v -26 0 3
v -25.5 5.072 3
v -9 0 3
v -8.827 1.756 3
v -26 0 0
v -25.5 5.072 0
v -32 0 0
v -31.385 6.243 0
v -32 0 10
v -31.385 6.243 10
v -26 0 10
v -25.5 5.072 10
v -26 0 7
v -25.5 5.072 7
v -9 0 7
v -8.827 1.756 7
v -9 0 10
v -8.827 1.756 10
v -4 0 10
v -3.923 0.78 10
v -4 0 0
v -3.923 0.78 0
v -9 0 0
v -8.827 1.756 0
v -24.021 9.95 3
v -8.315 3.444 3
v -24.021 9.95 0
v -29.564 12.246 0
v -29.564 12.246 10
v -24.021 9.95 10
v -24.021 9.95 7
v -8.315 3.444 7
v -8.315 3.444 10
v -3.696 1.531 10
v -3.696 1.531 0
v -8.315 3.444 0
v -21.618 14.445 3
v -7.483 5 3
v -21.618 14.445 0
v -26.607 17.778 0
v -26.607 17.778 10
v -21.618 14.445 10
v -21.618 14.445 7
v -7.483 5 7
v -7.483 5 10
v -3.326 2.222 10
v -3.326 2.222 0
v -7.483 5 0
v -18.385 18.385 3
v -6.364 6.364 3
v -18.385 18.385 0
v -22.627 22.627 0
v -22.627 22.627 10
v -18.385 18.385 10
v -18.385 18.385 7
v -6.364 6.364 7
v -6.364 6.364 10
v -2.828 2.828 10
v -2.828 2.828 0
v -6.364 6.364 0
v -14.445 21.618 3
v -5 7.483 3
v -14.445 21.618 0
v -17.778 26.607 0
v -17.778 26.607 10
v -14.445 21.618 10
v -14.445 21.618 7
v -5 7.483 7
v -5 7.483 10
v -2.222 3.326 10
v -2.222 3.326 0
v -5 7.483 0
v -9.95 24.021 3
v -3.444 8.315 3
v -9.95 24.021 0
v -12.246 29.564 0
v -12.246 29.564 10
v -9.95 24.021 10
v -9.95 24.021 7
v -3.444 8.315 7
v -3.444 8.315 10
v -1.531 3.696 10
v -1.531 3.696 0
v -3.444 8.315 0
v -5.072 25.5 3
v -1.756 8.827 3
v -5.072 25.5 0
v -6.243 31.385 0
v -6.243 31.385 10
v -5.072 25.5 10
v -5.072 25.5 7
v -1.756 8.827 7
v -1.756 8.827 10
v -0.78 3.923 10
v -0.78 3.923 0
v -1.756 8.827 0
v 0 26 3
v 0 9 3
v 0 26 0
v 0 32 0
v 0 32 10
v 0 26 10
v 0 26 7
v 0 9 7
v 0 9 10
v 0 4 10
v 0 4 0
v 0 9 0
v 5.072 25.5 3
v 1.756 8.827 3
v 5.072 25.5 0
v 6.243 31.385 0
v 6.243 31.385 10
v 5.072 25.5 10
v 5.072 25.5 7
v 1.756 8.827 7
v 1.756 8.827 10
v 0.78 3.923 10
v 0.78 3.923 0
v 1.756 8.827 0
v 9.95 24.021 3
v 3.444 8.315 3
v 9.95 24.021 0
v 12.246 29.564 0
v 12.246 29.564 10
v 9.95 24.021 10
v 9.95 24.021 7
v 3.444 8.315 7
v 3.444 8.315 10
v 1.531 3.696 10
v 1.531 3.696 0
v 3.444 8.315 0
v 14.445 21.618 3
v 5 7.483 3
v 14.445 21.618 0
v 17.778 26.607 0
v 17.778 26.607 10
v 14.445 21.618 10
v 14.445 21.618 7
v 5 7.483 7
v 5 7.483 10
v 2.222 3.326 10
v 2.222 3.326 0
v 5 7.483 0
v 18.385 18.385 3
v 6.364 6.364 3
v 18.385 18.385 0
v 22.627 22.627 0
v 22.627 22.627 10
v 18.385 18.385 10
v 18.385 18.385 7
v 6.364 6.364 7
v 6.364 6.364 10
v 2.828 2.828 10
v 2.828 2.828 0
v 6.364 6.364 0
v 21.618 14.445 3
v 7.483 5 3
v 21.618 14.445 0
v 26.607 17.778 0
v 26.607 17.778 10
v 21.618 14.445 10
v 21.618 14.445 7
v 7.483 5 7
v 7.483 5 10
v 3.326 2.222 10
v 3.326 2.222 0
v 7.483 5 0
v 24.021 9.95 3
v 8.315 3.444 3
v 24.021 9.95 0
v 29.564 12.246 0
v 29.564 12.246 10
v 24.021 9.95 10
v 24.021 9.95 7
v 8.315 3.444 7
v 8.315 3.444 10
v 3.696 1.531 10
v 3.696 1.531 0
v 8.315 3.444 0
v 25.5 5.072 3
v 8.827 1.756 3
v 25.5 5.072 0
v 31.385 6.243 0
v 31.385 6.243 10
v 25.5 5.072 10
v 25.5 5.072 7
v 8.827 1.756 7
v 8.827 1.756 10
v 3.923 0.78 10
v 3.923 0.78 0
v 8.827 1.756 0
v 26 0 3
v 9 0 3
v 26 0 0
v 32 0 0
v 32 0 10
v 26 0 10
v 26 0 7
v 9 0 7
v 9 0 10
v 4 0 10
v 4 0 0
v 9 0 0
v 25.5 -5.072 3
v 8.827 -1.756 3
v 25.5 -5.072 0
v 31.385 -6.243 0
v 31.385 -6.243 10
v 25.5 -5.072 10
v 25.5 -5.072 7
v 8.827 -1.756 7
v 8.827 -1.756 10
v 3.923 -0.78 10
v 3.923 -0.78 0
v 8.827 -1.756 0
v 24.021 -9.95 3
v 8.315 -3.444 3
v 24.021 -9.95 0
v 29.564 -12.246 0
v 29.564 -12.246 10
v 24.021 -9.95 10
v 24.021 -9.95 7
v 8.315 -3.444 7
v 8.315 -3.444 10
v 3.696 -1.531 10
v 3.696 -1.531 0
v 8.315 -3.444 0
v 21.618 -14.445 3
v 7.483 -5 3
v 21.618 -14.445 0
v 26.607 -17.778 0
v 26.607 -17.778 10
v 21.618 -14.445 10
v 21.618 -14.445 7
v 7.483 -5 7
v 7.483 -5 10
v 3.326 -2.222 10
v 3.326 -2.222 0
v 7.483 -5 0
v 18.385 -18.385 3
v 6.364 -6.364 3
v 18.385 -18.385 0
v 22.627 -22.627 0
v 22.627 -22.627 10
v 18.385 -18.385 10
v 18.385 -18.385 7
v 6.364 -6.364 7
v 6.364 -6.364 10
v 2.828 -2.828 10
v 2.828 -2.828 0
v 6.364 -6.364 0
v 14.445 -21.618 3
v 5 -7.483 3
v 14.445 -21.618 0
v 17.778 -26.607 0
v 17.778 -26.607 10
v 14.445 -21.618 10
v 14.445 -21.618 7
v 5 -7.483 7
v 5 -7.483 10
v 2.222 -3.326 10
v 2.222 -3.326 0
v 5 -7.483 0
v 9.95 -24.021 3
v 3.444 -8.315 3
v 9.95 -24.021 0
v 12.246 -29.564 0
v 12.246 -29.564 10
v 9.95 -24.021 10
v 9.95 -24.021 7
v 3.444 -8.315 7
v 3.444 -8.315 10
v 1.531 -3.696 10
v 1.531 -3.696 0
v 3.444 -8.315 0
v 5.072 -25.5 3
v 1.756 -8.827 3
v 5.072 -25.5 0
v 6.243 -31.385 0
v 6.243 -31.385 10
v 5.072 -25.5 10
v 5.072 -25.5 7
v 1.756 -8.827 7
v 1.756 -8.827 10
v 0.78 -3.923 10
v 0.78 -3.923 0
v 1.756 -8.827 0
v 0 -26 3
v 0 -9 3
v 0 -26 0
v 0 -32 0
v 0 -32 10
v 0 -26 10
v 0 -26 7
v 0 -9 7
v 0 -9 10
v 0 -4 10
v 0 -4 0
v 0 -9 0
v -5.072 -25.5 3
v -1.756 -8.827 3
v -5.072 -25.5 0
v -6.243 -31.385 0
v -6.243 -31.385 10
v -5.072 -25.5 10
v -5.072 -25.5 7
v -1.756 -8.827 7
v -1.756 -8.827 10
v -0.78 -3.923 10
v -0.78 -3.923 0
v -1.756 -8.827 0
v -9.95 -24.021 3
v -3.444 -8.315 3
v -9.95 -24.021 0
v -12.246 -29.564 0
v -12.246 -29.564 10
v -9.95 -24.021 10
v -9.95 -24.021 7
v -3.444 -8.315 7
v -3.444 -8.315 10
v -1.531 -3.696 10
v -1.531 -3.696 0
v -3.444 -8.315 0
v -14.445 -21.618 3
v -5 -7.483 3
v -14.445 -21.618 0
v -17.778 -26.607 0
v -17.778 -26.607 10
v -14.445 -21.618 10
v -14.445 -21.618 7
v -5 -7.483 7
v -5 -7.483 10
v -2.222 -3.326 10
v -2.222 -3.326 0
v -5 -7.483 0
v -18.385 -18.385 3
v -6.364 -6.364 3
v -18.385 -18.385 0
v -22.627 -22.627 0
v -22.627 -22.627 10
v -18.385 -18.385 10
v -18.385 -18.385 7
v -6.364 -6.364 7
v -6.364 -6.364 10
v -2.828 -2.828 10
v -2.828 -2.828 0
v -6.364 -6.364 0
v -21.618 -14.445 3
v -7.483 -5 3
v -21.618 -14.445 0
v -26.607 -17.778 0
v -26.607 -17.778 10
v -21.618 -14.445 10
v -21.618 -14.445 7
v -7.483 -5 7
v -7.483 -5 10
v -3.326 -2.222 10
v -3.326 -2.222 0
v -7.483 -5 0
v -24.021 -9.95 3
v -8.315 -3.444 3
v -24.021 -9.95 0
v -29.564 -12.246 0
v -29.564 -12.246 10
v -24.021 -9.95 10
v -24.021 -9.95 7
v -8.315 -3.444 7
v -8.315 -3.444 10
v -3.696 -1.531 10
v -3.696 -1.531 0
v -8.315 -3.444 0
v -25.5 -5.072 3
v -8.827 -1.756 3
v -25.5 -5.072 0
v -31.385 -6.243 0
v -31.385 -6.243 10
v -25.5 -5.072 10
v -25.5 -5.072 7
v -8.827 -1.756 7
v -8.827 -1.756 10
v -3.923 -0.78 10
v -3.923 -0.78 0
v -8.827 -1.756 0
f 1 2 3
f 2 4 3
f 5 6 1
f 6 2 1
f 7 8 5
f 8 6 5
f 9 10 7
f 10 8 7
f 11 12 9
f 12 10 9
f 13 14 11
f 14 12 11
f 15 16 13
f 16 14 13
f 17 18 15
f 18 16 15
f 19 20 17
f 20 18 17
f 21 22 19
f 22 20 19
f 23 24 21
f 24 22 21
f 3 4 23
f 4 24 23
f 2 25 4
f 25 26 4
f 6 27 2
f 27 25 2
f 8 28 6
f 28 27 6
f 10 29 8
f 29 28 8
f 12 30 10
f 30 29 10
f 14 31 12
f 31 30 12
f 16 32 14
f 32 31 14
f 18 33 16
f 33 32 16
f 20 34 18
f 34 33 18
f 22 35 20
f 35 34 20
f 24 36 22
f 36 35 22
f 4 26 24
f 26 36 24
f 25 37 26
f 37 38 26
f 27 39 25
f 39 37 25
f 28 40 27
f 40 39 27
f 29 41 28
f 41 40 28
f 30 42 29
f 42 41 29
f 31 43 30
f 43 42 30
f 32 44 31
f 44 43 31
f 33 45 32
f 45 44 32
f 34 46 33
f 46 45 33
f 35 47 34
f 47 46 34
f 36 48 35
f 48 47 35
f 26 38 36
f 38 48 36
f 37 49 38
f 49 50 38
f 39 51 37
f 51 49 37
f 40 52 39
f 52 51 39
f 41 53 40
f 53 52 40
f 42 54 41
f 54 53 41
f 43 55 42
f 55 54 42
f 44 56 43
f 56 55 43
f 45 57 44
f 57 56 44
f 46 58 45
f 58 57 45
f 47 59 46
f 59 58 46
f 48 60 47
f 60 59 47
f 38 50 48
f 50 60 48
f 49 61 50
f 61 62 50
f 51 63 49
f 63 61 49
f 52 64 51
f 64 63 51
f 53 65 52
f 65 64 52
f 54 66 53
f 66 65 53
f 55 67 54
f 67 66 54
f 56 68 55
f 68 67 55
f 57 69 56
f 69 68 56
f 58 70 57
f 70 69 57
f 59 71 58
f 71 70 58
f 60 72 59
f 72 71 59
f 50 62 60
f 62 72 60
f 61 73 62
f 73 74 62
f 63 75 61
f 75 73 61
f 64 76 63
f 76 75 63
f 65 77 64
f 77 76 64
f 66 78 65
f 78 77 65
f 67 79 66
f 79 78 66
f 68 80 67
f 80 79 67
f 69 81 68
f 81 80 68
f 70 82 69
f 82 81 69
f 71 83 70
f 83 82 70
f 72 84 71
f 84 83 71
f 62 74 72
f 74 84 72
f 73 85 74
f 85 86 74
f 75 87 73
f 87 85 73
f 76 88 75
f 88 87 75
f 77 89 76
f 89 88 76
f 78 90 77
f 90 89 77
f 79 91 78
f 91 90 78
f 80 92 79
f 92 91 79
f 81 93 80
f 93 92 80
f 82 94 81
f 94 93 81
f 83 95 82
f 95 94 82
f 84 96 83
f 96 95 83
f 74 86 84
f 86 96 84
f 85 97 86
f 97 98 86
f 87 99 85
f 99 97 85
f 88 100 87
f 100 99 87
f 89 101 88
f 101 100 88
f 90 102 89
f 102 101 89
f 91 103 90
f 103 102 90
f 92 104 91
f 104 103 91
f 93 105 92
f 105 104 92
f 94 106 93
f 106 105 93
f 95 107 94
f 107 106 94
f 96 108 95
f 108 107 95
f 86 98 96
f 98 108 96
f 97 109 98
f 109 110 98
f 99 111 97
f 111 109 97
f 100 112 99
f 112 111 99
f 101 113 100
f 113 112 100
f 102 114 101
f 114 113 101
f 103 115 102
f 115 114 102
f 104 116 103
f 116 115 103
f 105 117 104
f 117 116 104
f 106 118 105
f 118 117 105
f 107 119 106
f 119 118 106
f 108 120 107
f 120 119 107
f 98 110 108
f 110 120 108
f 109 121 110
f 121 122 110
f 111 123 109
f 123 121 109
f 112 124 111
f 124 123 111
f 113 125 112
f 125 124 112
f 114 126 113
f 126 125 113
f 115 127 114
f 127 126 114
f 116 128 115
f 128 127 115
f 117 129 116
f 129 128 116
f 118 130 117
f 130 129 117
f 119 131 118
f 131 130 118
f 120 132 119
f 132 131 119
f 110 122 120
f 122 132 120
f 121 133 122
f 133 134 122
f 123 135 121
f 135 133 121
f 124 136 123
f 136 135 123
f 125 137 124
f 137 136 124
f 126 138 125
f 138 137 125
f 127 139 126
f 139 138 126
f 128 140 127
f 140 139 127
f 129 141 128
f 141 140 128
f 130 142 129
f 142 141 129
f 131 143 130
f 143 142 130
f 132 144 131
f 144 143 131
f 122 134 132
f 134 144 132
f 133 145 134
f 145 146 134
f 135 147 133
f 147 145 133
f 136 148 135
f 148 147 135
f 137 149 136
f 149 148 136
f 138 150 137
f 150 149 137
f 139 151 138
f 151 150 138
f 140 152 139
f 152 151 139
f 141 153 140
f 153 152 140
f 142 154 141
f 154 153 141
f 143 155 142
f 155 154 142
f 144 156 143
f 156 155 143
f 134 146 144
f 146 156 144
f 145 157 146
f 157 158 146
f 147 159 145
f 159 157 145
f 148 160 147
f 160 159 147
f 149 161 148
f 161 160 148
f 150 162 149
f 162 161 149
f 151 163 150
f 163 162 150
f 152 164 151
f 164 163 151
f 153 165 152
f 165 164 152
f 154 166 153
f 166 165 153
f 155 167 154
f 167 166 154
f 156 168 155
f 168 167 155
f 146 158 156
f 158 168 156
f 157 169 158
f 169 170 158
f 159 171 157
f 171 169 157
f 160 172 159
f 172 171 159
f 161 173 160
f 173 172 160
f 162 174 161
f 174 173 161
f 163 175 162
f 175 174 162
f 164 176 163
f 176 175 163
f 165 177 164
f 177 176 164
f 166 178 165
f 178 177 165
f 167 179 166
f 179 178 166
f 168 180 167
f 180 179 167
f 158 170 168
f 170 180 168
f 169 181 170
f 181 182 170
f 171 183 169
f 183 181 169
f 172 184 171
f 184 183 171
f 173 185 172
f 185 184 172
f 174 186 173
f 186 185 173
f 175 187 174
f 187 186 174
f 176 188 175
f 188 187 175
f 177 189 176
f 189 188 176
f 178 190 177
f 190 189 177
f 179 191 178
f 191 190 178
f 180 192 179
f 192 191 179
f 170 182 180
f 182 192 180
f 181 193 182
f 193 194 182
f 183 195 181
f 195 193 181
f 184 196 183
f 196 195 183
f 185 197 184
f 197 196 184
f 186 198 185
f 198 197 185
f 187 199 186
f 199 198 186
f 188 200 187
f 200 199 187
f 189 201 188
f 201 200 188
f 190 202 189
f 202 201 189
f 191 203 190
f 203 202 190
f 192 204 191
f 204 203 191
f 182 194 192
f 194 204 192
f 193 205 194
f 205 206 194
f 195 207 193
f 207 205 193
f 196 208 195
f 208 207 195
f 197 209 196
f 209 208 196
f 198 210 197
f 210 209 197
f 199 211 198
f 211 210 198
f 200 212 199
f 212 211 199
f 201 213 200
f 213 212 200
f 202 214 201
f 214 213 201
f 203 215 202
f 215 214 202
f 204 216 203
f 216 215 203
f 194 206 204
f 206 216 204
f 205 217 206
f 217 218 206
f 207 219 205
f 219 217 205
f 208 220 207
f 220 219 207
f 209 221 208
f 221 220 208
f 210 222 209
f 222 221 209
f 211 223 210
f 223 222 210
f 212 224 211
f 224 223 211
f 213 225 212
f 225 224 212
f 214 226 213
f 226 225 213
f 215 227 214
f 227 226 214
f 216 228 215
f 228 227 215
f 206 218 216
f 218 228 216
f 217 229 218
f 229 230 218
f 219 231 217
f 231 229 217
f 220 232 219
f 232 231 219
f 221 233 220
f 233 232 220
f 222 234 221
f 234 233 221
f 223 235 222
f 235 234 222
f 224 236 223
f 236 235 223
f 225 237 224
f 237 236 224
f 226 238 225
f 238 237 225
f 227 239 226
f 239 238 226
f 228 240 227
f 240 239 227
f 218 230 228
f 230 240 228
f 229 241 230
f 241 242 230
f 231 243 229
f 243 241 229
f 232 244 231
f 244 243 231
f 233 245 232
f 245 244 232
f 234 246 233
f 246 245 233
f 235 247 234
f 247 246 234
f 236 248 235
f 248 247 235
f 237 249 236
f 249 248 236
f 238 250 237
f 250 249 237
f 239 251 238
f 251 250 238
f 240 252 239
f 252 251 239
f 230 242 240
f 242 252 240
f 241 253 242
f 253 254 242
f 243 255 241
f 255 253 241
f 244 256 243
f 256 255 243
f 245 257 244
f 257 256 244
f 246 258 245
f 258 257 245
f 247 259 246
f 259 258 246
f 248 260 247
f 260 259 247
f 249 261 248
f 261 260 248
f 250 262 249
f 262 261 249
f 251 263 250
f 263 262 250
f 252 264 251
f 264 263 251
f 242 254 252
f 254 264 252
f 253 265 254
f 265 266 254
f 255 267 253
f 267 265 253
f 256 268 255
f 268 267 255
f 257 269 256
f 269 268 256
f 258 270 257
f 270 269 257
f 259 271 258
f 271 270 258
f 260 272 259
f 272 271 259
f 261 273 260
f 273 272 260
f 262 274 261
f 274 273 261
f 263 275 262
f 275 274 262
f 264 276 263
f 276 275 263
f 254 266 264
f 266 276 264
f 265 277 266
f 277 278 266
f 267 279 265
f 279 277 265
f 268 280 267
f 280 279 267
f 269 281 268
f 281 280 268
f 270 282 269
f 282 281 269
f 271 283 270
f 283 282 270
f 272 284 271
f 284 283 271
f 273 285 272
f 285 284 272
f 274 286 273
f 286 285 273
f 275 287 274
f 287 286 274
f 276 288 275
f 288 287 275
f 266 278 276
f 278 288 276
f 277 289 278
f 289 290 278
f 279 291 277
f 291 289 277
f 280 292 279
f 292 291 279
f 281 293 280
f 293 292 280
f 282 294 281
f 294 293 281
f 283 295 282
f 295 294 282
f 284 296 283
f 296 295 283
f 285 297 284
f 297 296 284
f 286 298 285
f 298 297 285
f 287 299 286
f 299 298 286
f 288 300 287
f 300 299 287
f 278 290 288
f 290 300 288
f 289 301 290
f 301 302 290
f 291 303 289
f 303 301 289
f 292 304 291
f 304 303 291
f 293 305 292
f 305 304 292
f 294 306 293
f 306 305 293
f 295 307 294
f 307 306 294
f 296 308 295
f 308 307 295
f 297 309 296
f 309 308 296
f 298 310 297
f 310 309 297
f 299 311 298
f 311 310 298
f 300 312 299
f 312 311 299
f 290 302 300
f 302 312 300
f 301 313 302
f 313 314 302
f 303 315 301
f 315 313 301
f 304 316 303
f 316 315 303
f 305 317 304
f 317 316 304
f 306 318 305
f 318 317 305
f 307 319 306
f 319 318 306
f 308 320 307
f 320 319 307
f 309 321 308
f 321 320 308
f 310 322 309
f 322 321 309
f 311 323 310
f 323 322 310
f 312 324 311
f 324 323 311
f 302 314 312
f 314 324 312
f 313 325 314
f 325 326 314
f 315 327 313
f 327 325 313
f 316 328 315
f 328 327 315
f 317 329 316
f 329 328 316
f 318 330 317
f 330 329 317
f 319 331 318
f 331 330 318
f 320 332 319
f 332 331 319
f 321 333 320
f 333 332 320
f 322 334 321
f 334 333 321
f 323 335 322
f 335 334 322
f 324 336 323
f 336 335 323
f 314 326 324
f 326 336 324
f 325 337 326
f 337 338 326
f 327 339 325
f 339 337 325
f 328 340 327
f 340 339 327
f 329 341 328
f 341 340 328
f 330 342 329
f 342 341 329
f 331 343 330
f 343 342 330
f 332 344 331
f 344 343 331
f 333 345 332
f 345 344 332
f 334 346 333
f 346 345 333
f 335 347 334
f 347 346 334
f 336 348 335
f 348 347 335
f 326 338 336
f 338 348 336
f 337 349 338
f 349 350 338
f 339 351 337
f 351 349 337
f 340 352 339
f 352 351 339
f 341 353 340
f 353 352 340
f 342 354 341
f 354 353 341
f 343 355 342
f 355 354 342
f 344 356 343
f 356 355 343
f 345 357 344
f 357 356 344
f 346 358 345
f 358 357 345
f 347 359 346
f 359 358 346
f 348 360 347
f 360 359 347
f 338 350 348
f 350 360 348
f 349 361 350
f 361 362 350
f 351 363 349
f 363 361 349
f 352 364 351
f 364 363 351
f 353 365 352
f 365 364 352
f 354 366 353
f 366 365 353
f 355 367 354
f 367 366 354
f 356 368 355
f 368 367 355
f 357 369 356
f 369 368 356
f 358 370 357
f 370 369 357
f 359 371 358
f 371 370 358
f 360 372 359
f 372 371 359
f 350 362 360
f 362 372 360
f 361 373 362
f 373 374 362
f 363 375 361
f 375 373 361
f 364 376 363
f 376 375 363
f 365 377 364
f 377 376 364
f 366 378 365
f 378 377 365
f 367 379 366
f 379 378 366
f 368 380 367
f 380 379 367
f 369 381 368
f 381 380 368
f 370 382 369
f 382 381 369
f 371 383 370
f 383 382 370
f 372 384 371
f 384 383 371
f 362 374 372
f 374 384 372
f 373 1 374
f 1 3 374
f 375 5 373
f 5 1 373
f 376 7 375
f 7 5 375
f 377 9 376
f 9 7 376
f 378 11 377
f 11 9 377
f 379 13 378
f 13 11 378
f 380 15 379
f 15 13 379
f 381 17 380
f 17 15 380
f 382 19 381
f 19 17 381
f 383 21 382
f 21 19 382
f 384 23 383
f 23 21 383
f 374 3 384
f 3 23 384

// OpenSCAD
$fn = 32;

// ----------------------------------------------------------------------
// Revolved part: handwheel R32
// ----------------------------------------------------------------------

// --- parameters (mm) ---
bore_r = 4;               // bore radius
rim_r = 32;               // rim radius
rim_w = 6;                // rim axial width
rim_t = 10;               // rim diameter height
hub_r = 9;                // hub radius
web_t = 4;                // web thickness
revolve_angle = 360;      // revolve sweep, degrees

bore_d = 2 * bore_r;
rim_d = 2 * rim_r;
hub_d = 2 * hub_r;

profile = [[4, 0], [9, 0], [9, 3], [26, 3], [26, 0], [32, 0], [32, 10], [26, 10], [26, 7], [9, 7], [9, 10], [4, 10]];  // primary outline, 12 points, counter clockwise

// --- the one profile operation ---
rotate_extrude(angle = revolve_angle) polygon(points = profile);
